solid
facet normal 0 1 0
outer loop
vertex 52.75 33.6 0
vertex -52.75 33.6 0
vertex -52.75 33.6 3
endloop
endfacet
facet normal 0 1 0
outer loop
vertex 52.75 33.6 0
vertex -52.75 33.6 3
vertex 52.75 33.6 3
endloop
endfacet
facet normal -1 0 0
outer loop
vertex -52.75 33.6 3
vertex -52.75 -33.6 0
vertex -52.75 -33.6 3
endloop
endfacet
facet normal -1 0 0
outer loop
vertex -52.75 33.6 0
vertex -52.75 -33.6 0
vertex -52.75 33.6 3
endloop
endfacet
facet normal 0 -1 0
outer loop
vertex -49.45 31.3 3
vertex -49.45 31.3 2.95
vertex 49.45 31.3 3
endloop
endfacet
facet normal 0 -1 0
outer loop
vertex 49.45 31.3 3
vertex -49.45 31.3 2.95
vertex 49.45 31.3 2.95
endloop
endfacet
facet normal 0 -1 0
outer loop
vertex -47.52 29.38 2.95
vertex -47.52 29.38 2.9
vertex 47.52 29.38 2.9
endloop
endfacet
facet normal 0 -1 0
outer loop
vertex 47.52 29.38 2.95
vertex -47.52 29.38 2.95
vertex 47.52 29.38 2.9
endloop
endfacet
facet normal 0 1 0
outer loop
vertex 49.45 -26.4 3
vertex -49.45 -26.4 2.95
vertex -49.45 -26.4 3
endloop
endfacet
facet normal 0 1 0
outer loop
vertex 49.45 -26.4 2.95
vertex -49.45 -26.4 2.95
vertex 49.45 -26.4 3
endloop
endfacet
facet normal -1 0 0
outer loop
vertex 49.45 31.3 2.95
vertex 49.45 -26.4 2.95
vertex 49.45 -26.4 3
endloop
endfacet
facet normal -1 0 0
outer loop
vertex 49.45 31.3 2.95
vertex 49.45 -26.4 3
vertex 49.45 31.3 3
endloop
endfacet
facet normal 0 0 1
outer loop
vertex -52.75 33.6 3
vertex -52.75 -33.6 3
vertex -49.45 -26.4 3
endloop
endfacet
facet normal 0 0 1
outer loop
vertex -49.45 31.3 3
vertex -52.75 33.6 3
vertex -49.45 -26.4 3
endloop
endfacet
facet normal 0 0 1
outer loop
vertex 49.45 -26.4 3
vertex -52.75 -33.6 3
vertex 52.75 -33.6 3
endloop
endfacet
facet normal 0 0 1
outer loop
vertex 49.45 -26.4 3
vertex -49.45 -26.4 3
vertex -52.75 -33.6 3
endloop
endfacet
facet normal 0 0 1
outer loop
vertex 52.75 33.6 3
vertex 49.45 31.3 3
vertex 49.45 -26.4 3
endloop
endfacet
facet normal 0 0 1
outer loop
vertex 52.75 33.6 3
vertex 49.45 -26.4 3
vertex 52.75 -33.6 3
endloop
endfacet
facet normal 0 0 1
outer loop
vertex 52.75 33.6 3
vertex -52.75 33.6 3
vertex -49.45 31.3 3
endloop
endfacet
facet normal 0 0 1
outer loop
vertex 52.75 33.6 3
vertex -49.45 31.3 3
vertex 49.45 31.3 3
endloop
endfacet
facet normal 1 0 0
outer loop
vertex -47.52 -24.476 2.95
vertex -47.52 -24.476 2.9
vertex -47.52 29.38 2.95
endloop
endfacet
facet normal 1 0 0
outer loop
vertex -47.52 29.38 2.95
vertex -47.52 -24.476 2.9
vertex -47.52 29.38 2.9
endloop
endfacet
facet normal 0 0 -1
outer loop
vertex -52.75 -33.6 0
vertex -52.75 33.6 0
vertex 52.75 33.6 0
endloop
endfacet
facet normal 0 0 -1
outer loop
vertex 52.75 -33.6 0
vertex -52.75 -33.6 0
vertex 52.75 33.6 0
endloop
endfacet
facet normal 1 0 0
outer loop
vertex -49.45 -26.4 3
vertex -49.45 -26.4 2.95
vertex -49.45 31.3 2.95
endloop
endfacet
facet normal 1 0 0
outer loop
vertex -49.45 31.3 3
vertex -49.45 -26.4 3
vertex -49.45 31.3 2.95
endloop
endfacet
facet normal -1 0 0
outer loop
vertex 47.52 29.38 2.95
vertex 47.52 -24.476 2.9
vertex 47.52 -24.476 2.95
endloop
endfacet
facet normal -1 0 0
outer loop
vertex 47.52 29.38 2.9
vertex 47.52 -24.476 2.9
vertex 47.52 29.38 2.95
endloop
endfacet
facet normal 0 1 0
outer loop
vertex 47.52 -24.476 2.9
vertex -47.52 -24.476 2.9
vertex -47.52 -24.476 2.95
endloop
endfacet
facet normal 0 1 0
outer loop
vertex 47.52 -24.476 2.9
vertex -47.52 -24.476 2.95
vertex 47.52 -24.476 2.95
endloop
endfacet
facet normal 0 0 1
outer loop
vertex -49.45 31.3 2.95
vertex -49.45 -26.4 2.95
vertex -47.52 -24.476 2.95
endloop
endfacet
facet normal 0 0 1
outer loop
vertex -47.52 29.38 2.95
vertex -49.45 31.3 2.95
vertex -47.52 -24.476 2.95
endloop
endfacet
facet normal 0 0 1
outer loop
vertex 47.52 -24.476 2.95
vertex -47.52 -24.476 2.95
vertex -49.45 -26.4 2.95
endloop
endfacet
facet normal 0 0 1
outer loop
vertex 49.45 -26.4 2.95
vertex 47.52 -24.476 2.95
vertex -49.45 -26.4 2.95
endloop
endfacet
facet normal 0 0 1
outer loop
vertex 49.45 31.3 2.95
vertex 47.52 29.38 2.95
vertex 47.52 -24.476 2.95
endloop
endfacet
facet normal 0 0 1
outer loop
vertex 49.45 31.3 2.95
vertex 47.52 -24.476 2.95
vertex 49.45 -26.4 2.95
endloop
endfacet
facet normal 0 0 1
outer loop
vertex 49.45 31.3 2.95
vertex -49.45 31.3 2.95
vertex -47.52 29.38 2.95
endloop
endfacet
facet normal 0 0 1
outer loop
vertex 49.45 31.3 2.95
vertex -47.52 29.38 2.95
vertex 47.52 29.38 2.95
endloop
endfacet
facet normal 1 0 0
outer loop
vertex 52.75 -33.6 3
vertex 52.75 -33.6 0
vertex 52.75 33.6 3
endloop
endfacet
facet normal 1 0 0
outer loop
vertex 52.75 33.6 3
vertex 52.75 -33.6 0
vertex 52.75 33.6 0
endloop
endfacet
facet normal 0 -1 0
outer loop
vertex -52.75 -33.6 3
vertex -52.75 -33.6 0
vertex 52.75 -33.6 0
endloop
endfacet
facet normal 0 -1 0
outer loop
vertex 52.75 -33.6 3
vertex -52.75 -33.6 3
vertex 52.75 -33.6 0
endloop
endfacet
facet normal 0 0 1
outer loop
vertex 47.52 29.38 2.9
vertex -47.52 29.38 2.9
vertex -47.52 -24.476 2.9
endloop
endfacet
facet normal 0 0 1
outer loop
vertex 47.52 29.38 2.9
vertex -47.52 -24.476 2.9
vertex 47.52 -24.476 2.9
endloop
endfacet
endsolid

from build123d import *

# Parameters (mm, degrees)
SKETCH1_W           = 105.5
SKETCH1_H           = 67.2
SKETCH1_W_2         = 98.9
SKETCH1_H_2         = 57.7
BOSS_EXTRUDE1_DEPTH = 3
SKETCH1_3_W         = 98.9
SKETCH1_3_H         = 57.7
SKETCH1_3_W_2       = 95.04
SKETCH1_3_H_2       = 53.856
BOSS_EXTRUDE2_DEPTH = 2.95
SKETCH1_4_W         = 95.04
SKETCH1_4_H         = 53.856
BOSS_EXTRUDE3_DEPTH = 2.9


with BuildPart() as part:
    # Sketch1 → Boss-Extrude1 (new body)
    with BuildSketch(Plane.XY):
        Rectangle(SKETCH1_W, SKETCH1_H)
        with Locations((0, 2.45)):
            Rectangle(SKETCH1_W_2, SKETCH1_H_2, mode=Mode.SUBTRACT)
    extrude(amount=BOSS_EXTRUDE1_DEPTH)

    # Sketch1<3> → Boss-Extrude2 (add)
    with BuildSketch(Plane.XY):
        with Locations((0, 2.45)):
            Rectangle(SKETCH1_3_W, SKETCH1_3_H)
        with Locations((0, 2.452)):
            Rectangle(SKETCH1_3_W_2, SKETCH1_3_H_2, mode=Mode.SUBTRACT)
    extrude(amount=BOSS_EXTRUDE2_DEPTH)

    # Sketch1<4> → Boss-Extrude3 (add)
    with BuildSketch(Plane.XY):
        with Locations((0, 2.452)):
            Rectangle(SKETCH1_4_W, SKETCH1_4_H)
    extrude(amount=BOSS_EXTRUDE3_DEPTH)


solid = part.part
